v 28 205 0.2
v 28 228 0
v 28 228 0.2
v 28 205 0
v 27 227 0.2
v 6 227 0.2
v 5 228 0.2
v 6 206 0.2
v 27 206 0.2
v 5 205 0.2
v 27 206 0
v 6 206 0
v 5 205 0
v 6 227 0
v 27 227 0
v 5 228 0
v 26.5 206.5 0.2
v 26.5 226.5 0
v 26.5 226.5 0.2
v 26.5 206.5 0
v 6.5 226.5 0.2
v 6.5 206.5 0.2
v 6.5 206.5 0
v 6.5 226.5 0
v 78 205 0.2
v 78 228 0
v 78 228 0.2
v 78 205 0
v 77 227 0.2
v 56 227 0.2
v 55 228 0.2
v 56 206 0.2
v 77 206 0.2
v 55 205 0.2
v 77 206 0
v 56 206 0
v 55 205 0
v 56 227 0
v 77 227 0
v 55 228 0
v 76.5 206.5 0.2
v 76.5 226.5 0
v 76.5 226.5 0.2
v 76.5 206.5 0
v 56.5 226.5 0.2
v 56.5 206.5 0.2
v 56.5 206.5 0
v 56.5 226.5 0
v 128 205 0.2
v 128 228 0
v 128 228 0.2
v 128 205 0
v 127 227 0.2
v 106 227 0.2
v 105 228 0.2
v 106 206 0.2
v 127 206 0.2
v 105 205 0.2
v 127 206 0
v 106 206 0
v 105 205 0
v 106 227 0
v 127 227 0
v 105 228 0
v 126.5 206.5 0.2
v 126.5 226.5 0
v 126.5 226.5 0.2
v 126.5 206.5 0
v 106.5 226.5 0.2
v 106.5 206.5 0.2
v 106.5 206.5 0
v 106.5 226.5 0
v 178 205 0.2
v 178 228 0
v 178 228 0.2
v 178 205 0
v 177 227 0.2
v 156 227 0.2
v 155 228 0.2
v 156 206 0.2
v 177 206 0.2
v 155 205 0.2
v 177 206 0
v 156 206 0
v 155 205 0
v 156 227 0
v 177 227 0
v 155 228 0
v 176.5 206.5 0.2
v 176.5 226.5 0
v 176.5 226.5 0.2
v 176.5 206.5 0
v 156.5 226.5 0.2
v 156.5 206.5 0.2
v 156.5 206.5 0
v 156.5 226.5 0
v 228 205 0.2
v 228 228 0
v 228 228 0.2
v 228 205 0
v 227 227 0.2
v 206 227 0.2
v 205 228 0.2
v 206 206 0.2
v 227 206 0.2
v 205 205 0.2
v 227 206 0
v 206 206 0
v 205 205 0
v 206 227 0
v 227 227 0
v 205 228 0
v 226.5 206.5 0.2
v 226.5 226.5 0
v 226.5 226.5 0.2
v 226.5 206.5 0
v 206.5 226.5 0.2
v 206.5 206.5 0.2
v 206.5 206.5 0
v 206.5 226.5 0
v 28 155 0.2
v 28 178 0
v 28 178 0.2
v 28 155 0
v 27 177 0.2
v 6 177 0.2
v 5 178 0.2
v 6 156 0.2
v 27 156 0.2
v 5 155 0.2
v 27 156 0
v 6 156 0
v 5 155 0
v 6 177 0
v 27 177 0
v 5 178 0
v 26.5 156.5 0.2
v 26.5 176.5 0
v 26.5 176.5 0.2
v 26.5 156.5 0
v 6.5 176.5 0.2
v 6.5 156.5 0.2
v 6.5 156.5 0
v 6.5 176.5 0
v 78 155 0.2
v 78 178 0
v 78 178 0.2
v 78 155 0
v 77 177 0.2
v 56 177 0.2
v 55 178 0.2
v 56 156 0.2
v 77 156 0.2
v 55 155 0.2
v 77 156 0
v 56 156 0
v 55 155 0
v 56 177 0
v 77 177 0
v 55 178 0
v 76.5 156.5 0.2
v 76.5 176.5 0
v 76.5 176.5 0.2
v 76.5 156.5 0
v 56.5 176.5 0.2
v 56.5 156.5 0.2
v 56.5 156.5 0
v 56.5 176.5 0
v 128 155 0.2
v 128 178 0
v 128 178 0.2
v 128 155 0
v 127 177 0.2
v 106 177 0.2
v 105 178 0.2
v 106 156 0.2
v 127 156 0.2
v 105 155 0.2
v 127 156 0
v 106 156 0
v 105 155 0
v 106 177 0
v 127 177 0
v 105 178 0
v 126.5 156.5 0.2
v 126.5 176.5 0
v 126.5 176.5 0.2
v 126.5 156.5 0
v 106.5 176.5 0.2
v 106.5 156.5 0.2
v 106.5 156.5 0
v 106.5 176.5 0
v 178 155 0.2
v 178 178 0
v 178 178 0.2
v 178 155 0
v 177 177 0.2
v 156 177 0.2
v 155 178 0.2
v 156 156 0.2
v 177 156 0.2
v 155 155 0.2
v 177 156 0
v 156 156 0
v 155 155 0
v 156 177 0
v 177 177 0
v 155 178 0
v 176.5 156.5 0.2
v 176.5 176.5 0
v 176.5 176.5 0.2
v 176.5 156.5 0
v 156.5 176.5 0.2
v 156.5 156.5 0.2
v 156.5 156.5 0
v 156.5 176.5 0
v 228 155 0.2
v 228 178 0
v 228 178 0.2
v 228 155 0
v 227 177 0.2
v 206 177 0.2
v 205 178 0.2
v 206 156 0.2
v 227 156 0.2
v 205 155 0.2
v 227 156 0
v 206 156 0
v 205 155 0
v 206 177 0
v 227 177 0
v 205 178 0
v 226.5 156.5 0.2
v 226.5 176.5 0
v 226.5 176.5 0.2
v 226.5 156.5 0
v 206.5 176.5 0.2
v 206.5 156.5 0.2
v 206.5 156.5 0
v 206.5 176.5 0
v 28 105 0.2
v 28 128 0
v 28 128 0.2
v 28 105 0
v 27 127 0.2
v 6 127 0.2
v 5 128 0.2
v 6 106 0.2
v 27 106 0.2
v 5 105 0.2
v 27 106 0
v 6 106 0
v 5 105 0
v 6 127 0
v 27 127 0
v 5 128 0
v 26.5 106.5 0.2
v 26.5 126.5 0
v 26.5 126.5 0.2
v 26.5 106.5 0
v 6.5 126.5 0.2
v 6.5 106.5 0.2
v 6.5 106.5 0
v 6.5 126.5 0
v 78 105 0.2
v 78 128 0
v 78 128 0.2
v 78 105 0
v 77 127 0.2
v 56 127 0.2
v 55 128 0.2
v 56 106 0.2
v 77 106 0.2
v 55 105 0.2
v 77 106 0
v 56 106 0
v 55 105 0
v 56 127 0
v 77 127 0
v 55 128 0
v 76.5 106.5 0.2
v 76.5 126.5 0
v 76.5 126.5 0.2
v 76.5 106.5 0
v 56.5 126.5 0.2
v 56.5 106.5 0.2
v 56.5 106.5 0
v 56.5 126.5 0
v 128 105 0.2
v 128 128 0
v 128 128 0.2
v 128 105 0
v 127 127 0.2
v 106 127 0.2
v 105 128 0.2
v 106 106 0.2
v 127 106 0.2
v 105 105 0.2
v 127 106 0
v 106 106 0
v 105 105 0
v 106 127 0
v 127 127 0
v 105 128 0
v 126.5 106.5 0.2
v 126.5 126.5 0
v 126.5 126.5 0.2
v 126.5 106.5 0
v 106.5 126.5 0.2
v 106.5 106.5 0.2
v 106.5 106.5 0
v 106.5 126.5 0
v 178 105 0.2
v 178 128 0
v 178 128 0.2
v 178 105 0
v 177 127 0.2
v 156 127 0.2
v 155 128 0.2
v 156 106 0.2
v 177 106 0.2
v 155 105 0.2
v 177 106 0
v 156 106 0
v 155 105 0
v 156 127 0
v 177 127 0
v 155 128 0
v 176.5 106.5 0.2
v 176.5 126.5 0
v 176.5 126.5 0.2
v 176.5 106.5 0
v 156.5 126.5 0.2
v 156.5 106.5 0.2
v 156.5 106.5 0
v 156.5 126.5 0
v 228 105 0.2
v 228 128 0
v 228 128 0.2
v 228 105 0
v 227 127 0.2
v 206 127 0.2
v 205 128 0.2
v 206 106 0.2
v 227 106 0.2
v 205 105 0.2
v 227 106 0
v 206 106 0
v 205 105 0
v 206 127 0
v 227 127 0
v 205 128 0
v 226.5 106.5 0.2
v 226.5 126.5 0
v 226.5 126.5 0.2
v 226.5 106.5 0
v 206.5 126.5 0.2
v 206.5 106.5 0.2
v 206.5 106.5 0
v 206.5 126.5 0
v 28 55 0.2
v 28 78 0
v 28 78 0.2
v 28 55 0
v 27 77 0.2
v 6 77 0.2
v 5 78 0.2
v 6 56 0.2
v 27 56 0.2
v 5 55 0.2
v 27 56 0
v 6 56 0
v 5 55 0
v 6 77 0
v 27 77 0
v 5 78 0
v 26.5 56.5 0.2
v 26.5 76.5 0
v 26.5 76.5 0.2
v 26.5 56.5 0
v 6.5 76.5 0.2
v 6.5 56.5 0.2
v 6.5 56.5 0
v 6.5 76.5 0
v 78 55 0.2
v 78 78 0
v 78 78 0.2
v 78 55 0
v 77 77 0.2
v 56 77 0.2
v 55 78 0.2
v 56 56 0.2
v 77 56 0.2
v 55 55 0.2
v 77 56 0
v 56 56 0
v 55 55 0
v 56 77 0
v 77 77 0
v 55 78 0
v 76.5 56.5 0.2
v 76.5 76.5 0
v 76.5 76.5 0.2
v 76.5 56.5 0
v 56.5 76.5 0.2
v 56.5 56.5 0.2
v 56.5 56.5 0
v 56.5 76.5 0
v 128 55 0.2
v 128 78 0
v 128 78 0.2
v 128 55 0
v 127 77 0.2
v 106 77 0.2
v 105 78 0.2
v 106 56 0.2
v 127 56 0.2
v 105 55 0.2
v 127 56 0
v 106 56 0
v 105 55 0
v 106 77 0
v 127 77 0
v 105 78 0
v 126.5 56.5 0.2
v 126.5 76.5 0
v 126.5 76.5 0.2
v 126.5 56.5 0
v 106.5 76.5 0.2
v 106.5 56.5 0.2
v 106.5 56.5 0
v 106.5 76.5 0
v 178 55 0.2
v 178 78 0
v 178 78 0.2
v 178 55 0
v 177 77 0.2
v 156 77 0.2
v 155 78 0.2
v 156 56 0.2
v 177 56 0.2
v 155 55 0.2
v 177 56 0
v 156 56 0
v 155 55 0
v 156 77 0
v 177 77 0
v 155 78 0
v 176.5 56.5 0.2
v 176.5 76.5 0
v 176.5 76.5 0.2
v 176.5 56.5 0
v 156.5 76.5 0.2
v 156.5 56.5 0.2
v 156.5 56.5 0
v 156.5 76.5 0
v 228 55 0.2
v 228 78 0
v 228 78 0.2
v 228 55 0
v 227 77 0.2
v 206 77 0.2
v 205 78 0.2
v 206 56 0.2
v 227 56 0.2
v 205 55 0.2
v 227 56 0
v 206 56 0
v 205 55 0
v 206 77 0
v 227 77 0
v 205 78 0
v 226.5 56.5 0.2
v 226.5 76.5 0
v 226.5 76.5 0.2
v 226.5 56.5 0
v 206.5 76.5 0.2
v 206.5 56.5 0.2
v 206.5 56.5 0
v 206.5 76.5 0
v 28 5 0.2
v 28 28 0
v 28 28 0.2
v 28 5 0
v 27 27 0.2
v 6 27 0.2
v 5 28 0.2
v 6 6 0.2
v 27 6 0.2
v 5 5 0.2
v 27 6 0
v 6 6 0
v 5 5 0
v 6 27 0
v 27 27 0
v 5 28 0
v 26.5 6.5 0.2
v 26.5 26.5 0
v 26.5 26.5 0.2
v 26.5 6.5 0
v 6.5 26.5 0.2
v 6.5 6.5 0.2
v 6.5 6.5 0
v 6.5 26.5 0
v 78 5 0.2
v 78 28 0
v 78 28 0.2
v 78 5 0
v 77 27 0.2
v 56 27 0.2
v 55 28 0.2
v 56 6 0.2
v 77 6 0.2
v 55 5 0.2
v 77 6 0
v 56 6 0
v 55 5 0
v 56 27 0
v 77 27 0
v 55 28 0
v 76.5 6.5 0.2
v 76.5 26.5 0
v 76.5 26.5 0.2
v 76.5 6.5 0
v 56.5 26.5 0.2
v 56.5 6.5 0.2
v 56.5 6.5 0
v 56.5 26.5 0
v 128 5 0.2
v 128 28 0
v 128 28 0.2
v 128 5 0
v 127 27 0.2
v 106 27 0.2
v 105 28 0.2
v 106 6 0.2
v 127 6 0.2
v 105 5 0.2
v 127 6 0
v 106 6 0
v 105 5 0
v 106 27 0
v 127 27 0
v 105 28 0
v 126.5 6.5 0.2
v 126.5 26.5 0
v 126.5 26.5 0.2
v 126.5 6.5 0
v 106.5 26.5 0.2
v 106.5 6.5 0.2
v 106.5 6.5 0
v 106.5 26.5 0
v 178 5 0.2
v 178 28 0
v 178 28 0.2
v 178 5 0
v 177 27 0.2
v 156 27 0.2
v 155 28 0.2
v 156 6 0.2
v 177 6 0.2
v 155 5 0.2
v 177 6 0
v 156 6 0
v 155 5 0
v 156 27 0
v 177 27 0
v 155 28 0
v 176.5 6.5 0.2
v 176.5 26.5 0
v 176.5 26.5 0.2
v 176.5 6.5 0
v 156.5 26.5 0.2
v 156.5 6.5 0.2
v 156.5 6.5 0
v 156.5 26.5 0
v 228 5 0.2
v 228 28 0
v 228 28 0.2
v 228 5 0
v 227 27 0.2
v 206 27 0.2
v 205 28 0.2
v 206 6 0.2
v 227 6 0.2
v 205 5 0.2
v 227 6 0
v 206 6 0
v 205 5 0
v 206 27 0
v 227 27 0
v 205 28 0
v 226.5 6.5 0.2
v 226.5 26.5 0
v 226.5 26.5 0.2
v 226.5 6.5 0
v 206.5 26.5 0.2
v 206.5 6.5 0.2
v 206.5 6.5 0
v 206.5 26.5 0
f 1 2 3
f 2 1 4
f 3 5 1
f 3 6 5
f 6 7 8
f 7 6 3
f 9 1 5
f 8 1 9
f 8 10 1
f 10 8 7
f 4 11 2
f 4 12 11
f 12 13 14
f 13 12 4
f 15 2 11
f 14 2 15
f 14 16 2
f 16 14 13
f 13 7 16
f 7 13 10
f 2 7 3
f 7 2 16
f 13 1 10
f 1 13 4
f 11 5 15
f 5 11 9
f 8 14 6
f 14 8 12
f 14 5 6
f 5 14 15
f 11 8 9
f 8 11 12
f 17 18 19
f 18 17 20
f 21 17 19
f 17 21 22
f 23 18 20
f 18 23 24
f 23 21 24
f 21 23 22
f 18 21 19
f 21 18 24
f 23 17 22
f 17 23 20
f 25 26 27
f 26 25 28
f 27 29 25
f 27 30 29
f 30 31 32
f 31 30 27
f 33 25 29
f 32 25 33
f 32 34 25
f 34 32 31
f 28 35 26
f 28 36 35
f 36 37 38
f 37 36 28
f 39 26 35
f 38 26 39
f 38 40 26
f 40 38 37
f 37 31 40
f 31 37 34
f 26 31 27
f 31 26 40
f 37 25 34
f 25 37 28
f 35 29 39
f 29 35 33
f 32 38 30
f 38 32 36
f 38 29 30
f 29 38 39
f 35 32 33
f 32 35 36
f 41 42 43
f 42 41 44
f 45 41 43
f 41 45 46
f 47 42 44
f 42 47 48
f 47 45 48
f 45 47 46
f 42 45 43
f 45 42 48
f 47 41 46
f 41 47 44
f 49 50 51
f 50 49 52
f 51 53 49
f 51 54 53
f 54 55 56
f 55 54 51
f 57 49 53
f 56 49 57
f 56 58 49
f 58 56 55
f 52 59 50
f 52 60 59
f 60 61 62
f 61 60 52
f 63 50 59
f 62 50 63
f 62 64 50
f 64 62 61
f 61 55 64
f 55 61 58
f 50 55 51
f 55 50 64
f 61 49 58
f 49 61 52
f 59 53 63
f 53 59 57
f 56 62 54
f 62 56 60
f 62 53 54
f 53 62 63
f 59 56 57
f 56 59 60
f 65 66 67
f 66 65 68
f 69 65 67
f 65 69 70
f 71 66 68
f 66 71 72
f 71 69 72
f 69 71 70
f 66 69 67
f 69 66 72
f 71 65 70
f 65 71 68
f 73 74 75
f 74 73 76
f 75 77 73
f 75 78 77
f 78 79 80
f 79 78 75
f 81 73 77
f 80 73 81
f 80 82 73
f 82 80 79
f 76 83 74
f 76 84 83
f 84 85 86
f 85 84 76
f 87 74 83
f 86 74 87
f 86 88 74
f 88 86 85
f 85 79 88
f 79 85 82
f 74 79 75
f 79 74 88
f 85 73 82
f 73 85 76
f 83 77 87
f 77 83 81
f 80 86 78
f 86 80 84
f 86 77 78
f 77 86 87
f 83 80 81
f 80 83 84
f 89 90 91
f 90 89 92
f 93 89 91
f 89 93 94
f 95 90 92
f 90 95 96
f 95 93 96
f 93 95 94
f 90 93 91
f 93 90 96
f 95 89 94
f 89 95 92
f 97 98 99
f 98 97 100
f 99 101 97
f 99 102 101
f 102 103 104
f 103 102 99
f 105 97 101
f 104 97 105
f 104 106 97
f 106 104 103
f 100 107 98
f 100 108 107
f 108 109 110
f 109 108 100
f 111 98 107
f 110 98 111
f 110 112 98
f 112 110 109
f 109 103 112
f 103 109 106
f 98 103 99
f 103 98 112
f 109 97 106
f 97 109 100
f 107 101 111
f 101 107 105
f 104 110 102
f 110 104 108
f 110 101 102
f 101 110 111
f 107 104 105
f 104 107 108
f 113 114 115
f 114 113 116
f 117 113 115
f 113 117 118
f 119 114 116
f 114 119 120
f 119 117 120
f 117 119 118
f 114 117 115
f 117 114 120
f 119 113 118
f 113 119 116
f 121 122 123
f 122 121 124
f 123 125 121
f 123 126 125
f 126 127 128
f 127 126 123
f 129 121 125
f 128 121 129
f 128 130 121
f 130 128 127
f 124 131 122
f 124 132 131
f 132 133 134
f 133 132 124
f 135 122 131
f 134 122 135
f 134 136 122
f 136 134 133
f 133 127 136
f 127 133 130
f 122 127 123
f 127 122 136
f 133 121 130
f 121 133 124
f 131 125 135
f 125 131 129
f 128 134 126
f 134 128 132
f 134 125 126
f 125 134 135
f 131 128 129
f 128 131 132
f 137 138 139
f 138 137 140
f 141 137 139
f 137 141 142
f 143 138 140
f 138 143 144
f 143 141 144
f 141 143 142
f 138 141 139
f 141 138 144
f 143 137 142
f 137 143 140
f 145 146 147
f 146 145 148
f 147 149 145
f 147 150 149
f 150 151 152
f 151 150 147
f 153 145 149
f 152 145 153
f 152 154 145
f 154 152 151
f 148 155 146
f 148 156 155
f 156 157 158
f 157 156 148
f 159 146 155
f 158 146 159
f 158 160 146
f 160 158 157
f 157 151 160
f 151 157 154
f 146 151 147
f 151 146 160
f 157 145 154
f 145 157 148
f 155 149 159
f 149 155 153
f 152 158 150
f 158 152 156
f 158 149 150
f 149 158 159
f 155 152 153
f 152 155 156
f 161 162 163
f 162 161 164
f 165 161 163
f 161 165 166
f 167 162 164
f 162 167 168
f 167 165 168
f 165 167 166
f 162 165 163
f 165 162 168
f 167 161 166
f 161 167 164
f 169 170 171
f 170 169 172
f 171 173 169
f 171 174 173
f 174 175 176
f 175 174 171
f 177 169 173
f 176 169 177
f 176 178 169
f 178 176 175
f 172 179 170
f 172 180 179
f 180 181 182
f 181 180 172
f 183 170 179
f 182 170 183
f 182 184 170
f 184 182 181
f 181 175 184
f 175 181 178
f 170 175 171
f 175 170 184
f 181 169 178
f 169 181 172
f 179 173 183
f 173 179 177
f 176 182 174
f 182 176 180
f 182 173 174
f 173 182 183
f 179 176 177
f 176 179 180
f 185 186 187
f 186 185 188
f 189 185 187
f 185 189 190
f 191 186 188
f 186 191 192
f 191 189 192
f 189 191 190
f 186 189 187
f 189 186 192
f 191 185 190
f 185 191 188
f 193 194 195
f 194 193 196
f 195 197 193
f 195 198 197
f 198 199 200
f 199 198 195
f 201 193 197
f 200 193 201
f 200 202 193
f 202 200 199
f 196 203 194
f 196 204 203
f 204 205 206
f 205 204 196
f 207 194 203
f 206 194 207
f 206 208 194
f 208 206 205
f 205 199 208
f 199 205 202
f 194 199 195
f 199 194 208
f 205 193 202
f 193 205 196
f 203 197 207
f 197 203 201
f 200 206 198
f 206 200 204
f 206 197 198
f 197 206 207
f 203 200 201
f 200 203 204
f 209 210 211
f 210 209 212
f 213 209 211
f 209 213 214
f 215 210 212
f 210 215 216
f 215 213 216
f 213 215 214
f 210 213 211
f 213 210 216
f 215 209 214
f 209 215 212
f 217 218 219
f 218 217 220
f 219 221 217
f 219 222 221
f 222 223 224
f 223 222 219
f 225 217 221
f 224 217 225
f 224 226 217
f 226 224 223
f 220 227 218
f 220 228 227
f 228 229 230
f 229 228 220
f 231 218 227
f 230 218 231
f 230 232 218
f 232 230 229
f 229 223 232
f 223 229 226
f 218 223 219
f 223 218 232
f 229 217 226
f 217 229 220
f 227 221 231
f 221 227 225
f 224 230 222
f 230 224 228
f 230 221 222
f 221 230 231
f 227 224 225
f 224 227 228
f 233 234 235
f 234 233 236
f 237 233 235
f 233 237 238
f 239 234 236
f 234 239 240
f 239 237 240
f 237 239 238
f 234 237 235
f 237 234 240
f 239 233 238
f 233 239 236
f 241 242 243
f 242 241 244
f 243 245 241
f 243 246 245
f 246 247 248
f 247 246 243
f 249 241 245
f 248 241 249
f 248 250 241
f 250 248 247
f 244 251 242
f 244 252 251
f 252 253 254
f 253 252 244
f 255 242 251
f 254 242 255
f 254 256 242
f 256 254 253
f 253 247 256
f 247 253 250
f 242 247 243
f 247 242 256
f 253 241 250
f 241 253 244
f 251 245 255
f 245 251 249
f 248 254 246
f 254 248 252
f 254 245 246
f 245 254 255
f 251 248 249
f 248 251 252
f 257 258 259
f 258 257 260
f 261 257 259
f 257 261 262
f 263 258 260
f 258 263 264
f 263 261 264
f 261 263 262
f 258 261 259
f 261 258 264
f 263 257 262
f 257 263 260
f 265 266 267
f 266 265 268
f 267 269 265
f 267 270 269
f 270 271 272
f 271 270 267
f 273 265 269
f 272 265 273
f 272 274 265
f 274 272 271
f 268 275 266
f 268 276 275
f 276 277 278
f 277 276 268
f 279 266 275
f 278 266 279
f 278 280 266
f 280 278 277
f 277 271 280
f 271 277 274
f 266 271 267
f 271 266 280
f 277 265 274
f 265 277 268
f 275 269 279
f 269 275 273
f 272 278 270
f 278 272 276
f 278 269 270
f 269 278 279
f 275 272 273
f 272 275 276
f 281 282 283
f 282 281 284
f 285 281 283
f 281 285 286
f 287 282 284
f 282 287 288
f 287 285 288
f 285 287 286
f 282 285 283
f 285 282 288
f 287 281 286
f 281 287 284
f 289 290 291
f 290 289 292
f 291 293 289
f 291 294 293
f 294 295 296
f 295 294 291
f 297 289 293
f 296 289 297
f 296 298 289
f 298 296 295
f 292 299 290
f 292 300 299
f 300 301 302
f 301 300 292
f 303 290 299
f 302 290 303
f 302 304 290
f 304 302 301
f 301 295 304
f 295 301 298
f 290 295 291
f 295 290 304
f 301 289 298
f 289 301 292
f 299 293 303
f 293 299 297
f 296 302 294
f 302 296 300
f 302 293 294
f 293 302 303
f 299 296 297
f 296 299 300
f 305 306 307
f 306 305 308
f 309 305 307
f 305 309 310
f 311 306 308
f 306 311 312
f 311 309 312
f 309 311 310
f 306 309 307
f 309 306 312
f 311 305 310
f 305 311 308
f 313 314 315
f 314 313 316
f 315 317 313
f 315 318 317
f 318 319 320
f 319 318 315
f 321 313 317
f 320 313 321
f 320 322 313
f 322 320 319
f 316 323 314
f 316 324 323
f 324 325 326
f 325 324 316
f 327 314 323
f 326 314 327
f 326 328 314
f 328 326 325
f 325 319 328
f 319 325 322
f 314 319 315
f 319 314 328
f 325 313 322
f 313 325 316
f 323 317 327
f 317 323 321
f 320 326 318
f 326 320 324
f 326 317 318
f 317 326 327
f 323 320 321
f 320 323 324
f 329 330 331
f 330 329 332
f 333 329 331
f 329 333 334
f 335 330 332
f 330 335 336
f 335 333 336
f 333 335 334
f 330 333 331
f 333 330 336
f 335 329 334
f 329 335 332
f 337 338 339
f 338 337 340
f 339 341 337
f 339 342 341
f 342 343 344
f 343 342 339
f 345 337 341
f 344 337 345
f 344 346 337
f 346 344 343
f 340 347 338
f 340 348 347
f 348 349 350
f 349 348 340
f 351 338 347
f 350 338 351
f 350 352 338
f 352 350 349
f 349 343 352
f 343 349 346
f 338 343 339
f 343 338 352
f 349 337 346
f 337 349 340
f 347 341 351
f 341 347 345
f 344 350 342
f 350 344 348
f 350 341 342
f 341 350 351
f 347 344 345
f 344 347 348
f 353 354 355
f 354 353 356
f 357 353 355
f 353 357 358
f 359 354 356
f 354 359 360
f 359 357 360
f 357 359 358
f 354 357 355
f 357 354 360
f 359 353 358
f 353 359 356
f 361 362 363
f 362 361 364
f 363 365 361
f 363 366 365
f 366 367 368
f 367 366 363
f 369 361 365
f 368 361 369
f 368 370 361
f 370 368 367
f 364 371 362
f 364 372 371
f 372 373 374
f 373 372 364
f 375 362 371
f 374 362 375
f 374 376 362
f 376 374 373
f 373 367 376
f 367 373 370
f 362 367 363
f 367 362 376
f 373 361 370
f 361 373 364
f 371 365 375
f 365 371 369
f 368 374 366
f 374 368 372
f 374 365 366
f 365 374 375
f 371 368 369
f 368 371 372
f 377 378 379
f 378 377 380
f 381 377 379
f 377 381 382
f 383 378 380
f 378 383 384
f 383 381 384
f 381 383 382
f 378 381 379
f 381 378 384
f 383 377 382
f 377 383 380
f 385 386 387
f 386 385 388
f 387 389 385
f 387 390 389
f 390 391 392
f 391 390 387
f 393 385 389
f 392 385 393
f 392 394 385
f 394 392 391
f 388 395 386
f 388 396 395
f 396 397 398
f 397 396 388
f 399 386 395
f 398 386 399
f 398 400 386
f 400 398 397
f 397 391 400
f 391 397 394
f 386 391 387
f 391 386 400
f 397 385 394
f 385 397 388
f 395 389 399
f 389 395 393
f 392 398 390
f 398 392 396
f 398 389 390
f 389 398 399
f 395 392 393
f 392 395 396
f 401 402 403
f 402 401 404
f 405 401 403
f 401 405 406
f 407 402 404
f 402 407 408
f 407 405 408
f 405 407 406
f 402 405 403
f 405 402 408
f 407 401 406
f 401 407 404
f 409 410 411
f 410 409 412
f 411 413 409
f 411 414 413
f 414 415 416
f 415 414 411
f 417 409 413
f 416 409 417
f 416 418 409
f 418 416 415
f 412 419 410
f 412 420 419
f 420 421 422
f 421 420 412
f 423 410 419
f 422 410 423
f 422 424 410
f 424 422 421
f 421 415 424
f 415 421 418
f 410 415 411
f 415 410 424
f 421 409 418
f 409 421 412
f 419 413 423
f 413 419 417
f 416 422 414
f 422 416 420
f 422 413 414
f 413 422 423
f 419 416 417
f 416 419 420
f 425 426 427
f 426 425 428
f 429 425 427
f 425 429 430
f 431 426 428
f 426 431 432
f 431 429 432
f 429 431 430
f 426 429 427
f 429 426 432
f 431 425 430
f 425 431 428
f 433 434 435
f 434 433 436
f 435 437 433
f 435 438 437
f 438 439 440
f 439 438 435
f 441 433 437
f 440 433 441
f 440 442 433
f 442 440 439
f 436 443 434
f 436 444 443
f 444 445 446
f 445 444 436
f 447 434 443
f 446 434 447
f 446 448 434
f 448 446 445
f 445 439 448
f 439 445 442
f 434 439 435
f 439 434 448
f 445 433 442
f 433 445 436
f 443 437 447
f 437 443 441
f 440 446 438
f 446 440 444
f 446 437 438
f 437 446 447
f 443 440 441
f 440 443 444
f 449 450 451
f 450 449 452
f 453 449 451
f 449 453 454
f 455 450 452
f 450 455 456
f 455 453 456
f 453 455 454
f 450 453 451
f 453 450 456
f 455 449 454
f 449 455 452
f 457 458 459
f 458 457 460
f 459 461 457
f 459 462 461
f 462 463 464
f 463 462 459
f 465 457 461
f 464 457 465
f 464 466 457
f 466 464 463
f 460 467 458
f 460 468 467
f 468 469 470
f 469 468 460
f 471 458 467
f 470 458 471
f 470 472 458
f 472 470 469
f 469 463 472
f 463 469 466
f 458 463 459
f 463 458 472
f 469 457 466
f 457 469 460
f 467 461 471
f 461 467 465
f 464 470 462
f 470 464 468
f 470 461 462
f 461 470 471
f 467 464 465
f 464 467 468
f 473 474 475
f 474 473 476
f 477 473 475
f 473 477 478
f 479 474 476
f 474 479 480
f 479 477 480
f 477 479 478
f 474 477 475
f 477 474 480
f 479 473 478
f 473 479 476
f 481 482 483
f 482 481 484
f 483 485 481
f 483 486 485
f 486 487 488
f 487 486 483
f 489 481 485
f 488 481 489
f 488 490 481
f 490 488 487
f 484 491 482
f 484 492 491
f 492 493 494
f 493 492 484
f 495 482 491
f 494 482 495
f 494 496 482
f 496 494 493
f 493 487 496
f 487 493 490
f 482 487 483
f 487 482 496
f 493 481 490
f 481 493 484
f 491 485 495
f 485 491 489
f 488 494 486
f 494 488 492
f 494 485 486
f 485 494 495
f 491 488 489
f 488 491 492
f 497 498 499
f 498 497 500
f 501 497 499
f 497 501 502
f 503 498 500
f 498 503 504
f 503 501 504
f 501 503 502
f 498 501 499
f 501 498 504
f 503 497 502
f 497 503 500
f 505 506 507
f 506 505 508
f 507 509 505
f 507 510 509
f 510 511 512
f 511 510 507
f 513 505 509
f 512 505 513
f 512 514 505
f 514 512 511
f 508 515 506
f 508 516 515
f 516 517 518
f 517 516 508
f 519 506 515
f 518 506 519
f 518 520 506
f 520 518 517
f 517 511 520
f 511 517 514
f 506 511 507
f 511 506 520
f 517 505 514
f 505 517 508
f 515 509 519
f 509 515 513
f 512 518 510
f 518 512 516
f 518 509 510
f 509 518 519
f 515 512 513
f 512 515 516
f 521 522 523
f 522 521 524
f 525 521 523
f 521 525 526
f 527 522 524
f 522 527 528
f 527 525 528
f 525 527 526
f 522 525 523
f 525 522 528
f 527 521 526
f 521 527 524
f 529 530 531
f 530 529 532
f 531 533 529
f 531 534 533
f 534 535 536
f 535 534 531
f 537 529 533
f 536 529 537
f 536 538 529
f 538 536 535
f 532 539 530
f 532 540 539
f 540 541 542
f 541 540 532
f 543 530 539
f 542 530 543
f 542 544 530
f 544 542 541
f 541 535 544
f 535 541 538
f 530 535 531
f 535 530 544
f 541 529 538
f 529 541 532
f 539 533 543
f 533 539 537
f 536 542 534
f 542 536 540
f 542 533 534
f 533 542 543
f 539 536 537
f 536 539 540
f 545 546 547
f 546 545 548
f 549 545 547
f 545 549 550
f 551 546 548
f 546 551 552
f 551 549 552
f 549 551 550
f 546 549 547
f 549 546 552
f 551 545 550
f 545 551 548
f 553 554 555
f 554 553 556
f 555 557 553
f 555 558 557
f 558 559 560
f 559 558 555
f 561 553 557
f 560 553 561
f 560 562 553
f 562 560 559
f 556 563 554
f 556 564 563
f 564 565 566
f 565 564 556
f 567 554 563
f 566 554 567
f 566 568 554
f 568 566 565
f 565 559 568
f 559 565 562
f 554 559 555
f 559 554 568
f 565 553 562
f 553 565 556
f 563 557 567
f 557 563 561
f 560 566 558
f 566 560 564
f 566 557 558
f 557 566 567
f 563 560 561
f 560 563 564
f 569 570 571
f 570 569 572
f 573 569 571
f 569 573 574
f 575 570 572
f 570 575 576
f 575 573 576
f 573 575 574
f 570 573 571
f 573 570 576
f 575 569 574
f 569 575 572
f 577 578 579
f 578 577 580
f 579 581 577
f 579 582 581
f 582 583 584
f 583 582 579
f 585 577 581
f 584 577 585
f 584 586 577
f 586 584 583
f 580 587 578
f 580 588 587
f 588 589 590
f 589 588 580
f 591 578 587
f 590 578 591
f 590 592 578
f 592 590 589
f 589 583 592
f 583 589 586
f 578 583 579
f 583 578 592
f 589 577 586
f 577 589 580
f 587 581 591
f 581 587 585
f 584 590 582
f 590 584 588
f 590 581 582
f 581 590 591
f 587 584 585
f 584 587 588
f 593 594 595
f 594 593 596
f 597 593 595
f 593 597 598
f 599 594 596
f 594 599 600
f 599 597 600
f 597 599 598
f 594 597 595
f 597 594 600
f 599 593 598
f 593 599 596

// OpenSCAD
/**
 * Print designed to check that you bed is level
 *
 * print four small squares in each corner to ensure even print quality and good adhesion.
 */

// Define your printers printable area
// If you are using Sprinter firmware then these come directly from configuration.h

/* [Dimensions] */

//Length of X axis [mm]
X_MAX_LENGTH = 230; // [1:1:500]

//Length of Y axis [mm]
Y_MAX_LENGTH = 230; // [1:500]

//Thickness (height) of square [mm]
THICKNESS = 0.2; // [0:0.05:1]

/* [Customize grid] */

//Choose preconfigured grid or choose custom and change parameters below
PRESET = "all"; // [custom:Custom (use parameters below),corners_only:Corners only,3x3:3x3 grid,all:Full 5x5 grid]

//Do you want to see square X1 Y1?
GRID_1_1 = 1; // [0:No, 1:Yes]
//Do you want to see square X2 Y1?
GRID_2_1 = 1; // [0:No, 1:Yes]
//Do you want to see square X3 Y1?
GRID_3_1 = 1; // [0:No, 1:Yes]
//Do you want to see square X4 Y1?
GRID_4_1 = 1; // [0:No, 1:Yes]
//Do you want to see square X5 Y1?
GRID_5_1 = 1; // [0:No, 1:Yes]
//Do you want to see square X1 Y2?
GRID_1_2 = 1; // [0:No, 1:Yes]
//Do you want to see square X2 Y2?
GRID_2_2 = 1; // [0:No, 1:Yes]
//Do you want to see square X3 Y2?
GRID_3_2 = 1; // [0:No, 1:Yes]
//Do you want to see square X4 Y2?
GRID_4_2 = 1; // [0:No, 1:Yes]
//Do you want to see square X5 Y2?
GRID_5_2 = 1; // [0:No, 1:Yes]
//Do you want to see square X1 Y3?
GRID_1_3 = 1; // [0:No, 1:Yes]
//Do you want to see square X2 Y3?
GRID_2_3 = 1; // [0:No, 1:Yes]
//Do you want to see square X3 Y3?
GRID_3_3 = 1; // [0:No, 1:Yes]
//Do you want to see square X4 Y3?
GRID_4_3 = 1; // [0:No, 1:Yes]
//Do you want to see square X5 Y3?
GRID_5_3 = 1; // [0:No, 1:Yes]
//Do you want to see square X1 Y4?
GRID_1_4 = 1; // [0:No, 1:Yes]
//Do you want to see square X2 Y4?
GRID_2_4 = 1; // [0:No, 1:Yes]
//Do you want to see square X3 Y4?
GRID_3_4 = 1; // [0:No, 1:Yes]
//Do you want to see square X4 Y4?
GRID_4_4 = 1; // [0:No, 1:Yes]
//Do you want to see square X5 Y4?
GRID_5_4 = 1; // [0:No, 1:Yes]
//Do you want to see square X1 Y5?
GRID_1_5 = 1; // [0:No, 1:Yes]
//Do you want to see square X2 Y5?
GRID_2_5 = 1; // [0:No, 1:Yes]
//Do you want to see square X3 Y5?
GRID_3_5 = 1; // [0:No, 1:Yes]
//Do you want to see square X4 Y5?
GRID_4_5 = 1; // [0:No, 1:Yes]
//Do you want to see square X5 Y5?
GRID_5_5 = 1; // [0:No, 1:Yes]

/* [For experts] */

//Square size [mm]
SIZE = 20; // [1:1:100]

//Width of margin between square and parameter
GAP = 0.5; // [0:0.1:2]

//Width of outline
OUTLINE_WIDTH = 1; //[0:0.1:2]

//Offset from limits in each axis
OFFSET = 5; // [1:1:500]

if (PRESET == "custom") {
    /* Grid X1 */
    if (GRID_1_1) {
        translate([OFFSET, Y_MAX_LENGTH - OFFSET - SIZE, 0]) square(); //Top Left
    }
    if (GRID_2_1) {
        translate([OFFSET + SIZE + (  ((X_MAX_LENGTH / 2) - (SIZE / 2) - (OFFSET + SIZE)) / 2 - (SIZE / 2)  ), Y_MAX_LENGTH - OFFSET - SIZE, 0]) square(); //Top Left-Middle
    }
    if (GRID_3_1) {
        translate([(X_MAX_LENGTH / 2) - (SIZE / 2), Y_MAX_LENGTH - OFFSET - SIZE, 0]) square(); //Top Middle
    }
    if (GRID_4_1) {
        translate([(X_MAX_LENGTH / 2) + (SIZE / 2) + (  ((X_MAX_LENGTH - OFFSET - SIZE) - (X_MAX_LENGTH / 2) - (SIZE / 2)) / 2 - (SIZE / 2)  ), Y_MAX_LENGTH - OFFSET - SIZE, 0]) square(); //Top Right-Middle
    }
    if (GRID_5_1) {
        translate([X_MAX_LENGTH - OFFSET - SIZE, Y_MAX_LENGTH - OFFSET - SIZE, 0]) square(); //Top Right
    }

    /* Grid X2 */
    if (GRID_1_2) {
        translate([OFFSET, (Y_MAX_LENGTH / 2) + (SIZE / 2) + (  ((Y_MAX_LENGTH - OFFSET - SIZE) - (Y_MAX_LENGTH / 2) - (SIZE / 2)) / 2 - (SIZE / 2)  ), 0]) square(); //Top-Middle Left
    }
    if (GRID_2_2) {
        translate([OFFSET + SIZE + (  ((X_MAX_LENGTH / 2) - (SIZE / 2) - (OFFSET + SIZE)) / 2 - (SIZE / 2)  ), (Y_MAX_LENGTH / 2) + (SIZE / 2) + (  ((Y_MAX_LENGTH - OFFSET - SIZE) - (Y_MAX_LENGTH / 2) - (SIZE / 2)) / 2 - (SIZE / 2)  ), 0]) square(); //Top-Middle Left-Middle
    }
    if (GRID_3_2) {
        translate([(X_MAX_LENGTH / 2) - (SIZE / 2), (Y_MAX_LENGTH / 2) + (SIZE / 2) + (  ((Y_MAX_LENGTH - OFFSET - SIZE) - (Y_MAX_LENGTH / 2) - (SIZE / 2)) / 2 - (SIZE / 2)  ), 0]) square(); //Top-Middle Middle
    }
    if (GRID_4_2) {
        translate([(X_MAX_LENGTH / 2) + (SIZE / 2) + (  ((X_MAX_LENGTH - OFFSET - SIZE) - (X_MAX_LENGTH / 2) - (SIZE / 2)) / 2 - (SIZE / 2)  ), (Y_MAX_LENGTH / 2) + (SIZE / 2) + (  ((Y_MAX_LENGTH - OFFSET - SIZE) - (Y_MAX_LENGTH / 2) - (SIZE / 2)) / 2 - (SIZE / 2)  ), 0]) square(); //Top-Middle Right-Middle
    }
    if (GRID_5_2) {
        translate([X_MAX_LENGTH - OFFSET - SIZE, (Y_MAX_LENGTH / 2) + (SIZE / 2) + (  ((Y_MAX_LENGTH - OFFSET - SIZE) - (Y_MAX_LENGTH / 2) - (SIZE / 2)) / 2 - (SIZE / 2)  ), 0]) square(); //Top-Middle Right
    }

    /* Grid X3 */
    if (GRID_1_3) {
        translate([OFFSET, (Y_MAX_LENGTH / 2) - (SIZE / 2), 0]) square(); //Middle Left
    }
    if (GRID_2_3) {
        translate([OFFSET + SIZE + (  ((X_MAX_LENGTH / 2) - (SIZE / 2) - (OFFSET + SIZE)) / 2 - (SIZE / 2)  ), (Y_MAX_LENGTH / 2) - (SIZE / 2), 0]) square(); //Middle Left-Middle
    }
    if (GRID_3_3) {
        translate([(X_MAX_LENGTH / 2) - (SIZE / 2), (Y_MAX_LENGTH / 2) - (SIZE / 2), 0]) square(); //Middle Middle
    }
    if (GRID_4_3) {
        translate([(X_MAX_LENGTH / 2) + (SIZE / 2) + (  ((X_MAX_LENGTH - OFFSET - SIZE) - (X_MAX_LENGTH / 2) - (SIZE / 2)) / 2 - (SIZE / 2)  ), (Y_MAX_LENGTH / 2) - (SIZE / 2), 0]) square(); //Middle Right-Middle
    }
    if (GRID_5_3) {
        translate([X_MAX_LENGTH - OFFSET - SIZE, (Y_MAX_LENGTH / 2) - (SIZE / 2), 0]) square(); //Middle Right
    }

    /* Grid X4 */
    if (GRID_1_4) {
        translate([OFFSET, OFFSET + SIZE + (  ((Y_MAX_LENGTH / 2) - (SIZE / 2) - (OFFSET + SIZE)) / 2 - (SIZE / 2)  ), 0]) square(); //Bottom-Middle Left
    }
    if (GRID_2_4) {
        translate([OFFSET + SIZE + (  ((X_MAX_LENGTH / 2) - (SIZE / 2) - (OFFSET + SIZE)) / 2 - (SIZE / 2)  ), OFFSET + SIZE + (  ((Y_MAX_LENGTH / 2) - (SIZE / 2) - (OFFSET + SIZE)) / 2 - (SIZE / 2)  ), 0]) square(); //Bottom-Middle Left-Middle
    }
    if (GRID_3_4) {
        translate([(X_MAX_LENGTH / 2) - (SIZE / 2), OFFSET + SIZE + (  ((Y_MAX_LENGTH / 2) - (SIZE / 2) - (OFFSET + SIZE)) / 2 - (SIZE / 2)  ), 0]) square(); //Bottom-Middle Middle
    }
    if (GRID_4_4) {
        translate([(X_MAX_LENGTH / 2) + (SIZE / 2) + (  ((X_MAX_LENGTH - OFFSET - SIZE) - (X_MAX_LENGTH / 2) - (SIZE / 2)) / 2 - (SIZE / 2)  ), OFFSET + SIZE + (  ((Y_MAX_LENGTH / 2) - (SIZE / 2) - (OFFSET + SIZE)) / 2 - (SIZE / 2)  ), 0]) square(); //Bottom-Middle Right-Middle
    }
    if (GRID_5_4) {
        translate([X_MAX_LENGTH - OFFSET - SIZE, OFFSET + SIZE + (  ((Y_MAX_LENGTH / 2) - (SIZE / 2) - (OFFSET + SIZE)) / 2 - (SIZE / 2)  ), 0]) square(); //Bottom-Middle Right
    }

    if (GRID_1_5) {
        translate([OFFSET, OFFSET, 0]) square(); //Bottom Left
    }
    if (GRID_2_5) {
        translate([OFFSET + SIZE + (  ((X_MAX_LENGTH / 2) - (SIZE / 2) - (OFFSET + SIZE)) / 2 - (SIZE / 2)  ), OFFSET, 0]) square(); //Bottom Left-Middle
    }
    if (GRID_3_5) {
        translate([(X_MAX_LENGTH / 2) - (SIZE / 2), OFFSET, 0]) square(); //Bottom Middle
    }
    if (GRID_4_5) {
        translate([(X_MAX_LENGTH / 2) + (SIZE / 2) + (  ((X_MAX_LENGTH - OFFSET - SIZE) - (X_MAX_LENGTH / 2) - (SIZE / 2)) / 2 - (SIZE / 2)  ), OFFSET, 0]) square(); //Bottom Right-Middle
    }
    if (GRID_5_5) {
        translate([X_MAX_LENGTH - OFFSET - SIZE, OFFSET, 0]) square(); //Bottom Right
    }
} else if (PRESET == "all") {
    translate([OFFSET, Y_MAX_LENGTH - OFFSET - SIZE, 0]) square(); //Top Left
    translate([OFFSET + SIZE + (  ((X_MAX_LENGTH / 2) - (SIZE / 2) - (OFFSET + SIZE)) / 2 - (SIZE / 2)  ), Y_MAX_LENGTH - OFFSET - SIZE, 0]) square(); //Top Left-Middle
    translate([(X_MAX_LENGTH / 2) - (SIZE / 2), Y_MAX_LENGTH - OFFSET - SIZE, 0]) square(); //Top Middle
    translate([(X_MAX_LENGTH / 2) + (SIZE / 2) + (  ((X_MAX_LENGTH - OFFSET - SIZE) - (X_MAX_LENGTH / 2) - (SIZE / 2)) / 2 - (SIZE / 2)  ), Y_MAX_LENGTH - OFFSET - SIZE, 0]) square(); //Top Right-Middle
    translate([X_MAX_LENGTH - OFFSET - SIZE, Y_MAX_LENGTH - OFFSET - SIZE, 0]) square(); //Top Right

    translate([OFFSET, (Y_MAX_LENGTH / 2) + (SIZE / 2) + (  ((Y_MAX_LENGTH - OFFSET - SIZE) - (Y_MAX_LENGTH / 2) - (SIZE / 2)) / 2 - (SIZE / 2)  ), 0]) square(); //Top-Middle Left
    translate([OFFSET + SIZE + (  ((X_MAX_LENGTH / 2) - (SIZE / 2) - (OFFSET + SIZE)) / 2 - (SIZE / 2)  ), (Y_MAX_LENGTH / 2) + (SIZE / 2) + (  ((Y_MAX_LENGTH - OFFSET - SIZE) - (Y_MAX_LENGTH / 2) - (SIZE / 2)) / 2 - (SIZE / 2)  ), 0]) square(); //Top-Middle Left-Middle
    translate([(X_MAX_LENGTH / 2) - (SIZE / 2), (Y_MAX_LENGTH / 2) + (SIZE / 2) + (  ((Y_MAX_LENGTH - OFFSET - SIZE) - (Y_MAX_LENGTH / 2) - (SIZE / 2)) / 2 - (SIZE / 2)  ), 0]) square(); //Top-Middle Middle
    translate([(X_MAX_LENGTH / 2) + (SIZE / 2) + (  ((X_MAX_LENGTH - OFFSET - SIZE) - (X_MAX_LENGTH / 2) - (SIZE / 2)) / 2 - (SIZE / 2)  ), (Y_MAX_LENGTH / 2) + (SIZE / 2) + (  ((Y_MAX_LENGTH - OFFSET - SIZE) - (Y_MAX_LENGTH / 2) - (SIZE / 2)) / 2 - (SIZE / 2)  ), 0]) square(); //Top-Middle Right-Middle
    translate([X_MAX_LENGTH - OFFSET - SIZE, (Y_MAX_LENGTH / 2) + (SIZE / 2) + (  ((Y_MAX_LENGTH - OFFSET - SIZE) - (Y_MAX_LENGTH / 2) - (SIZE / 2)) / 2 - (SIZE / 2)  ), 0]) square(); //Top-Middle Right

    translate([OFFSET, (Y_MAX_LENGTH / 2) - (SIZE / 2), 0]) square(); //Middle Left
    translate([OFFSET + SIZE + (  ((X_MAX_LENGTH / 2) - (SIZE / 2) - (OFFSET + SIZE)) / 2 - (SIZE / 2)  ), (Y_MAX_LENGTH / 2) - (SIZE / 2), 0]) square(); //Middle Left-Middle
    translate([(X_MAX_LENGTH / 2) - (SIZE / 2), (Y_MAX_LENGTH / 2) - (SIZE / 2), 0]) square(); //Middle Middle
    translate([(X_MAX_LENGTH / 2) + (SIZE / 2) + (  ((X_MAX_LENGTH - OFFSET - SIZE) - (X_MAX_LENGTH / 2) - (SIZE / 2)) / 2 - (SIZE / 2)  ), (Y_MAX_LENGTH / 2) - (SIZE / 2), 0]) square(); //Middle Right-Middle
    translate([X_MAX_LENGTH - OFFSET - SIZE, (Y_MAX_LENGTH / 2) - (SIZE / 2), 0]) square(); //Middle Right

    translate([OFFSET, OFFSET + SIZE + (  ((Y_MAX_LENGTH / 2) - (SIZE / 2) - (OFFSET + SIZE)) / 2 - (SIZE / 2)  ), 0]) square(); //Bottom-Middle Left
    translate([OFFSET + SIZE + (  ((X_MAX_LENGTH / 2) - (SIZE / 2) - (OFFSET + SIZE)) / 2 - (SIZE / 2)  ), OFFSET + SIZE + (  ((Y_MAX_LENGTH / 2) - (SIZE / 2) - (OFFSET + SIZE)) / 2 - (SIZE / 2)  ), 0]) square(); //Bottom-Middle Left-Middle
    translate([(X_MAX_LENGTH / 2) - (SIZE / 2), OFFSET + SIZE + (  ((Y_MAX_LENGTH / 2) - (SIZE / 2) - (OFFSET + SIZE)) / 2 - (SIZE / 2)  ), 0]) square(); //Bottom-Middle Middle
    translate([(X_MAX_LENGTH / 2) + (SIZE / 2) + (  ((X_MAX_LENGTH - OFFSET - SIZE) - (X_MAX_LENGTH / 2) - (SIZE / 2)) / 2 - (SIZE / 2)  ), OFFSET + SIZE + (  ((Y_MAX_LENGTH / 2) - (SIZE / 2) - (OFFSET + SIZE)) / 2 - (SIZE / 2)  ), 0]) square(); //Bottom-Middle Right-Middle
    translate([X_MAX_LENGTH - OFFSET - SIZE, OFFSET + SIZE + (  ((Y_MAX_LENGTH / 2) - (SIZE / 2) - (OFFSET + SIZE)) / 2 - (SIZE / 2)  ), 0]) square(); //Bottom-Middle Right

    translate([OFFSET, OFFSET, 0]) square(); //Bottom Left
    translate([OFFSET + SIZE + (  ((X_MAX_LENGTH / 2) - (SIZE / 2) - (OFFSET + SIZE)) / 2 - (SIZE / 2)  ), OFFSET, 0]) square(); //Bottom Left-Middle
    translate([(X_MAX_LENGTH / 2) - (SIZE / 2), OFFSET, 0]) square(); //Bottom Middle
    translate([(X_MAX_LENGTH / 2) + (SIZE / 2) + (  ((X_MAX_LENGTH - OFFSET - SIZE) - (X_MAX_LENGTH / 2) - (SIZE / 2)) / 2 - (SIZE / 2)  ), OFFSET, 0]) square(); //Bottom Right-Middle
    translate([X_MAX_LENGTH - OFFSET - SIZE, OFFSET, 0]) square(); //Bottom Right
} else if (PRESET == "corners_only") {
    translate([OFFSET, Y_MAX_LENGTH - OFFSET - SIZE, 0]) square(); //Top Left
    translate([X_MAX_LENGTH - OFFSET - SIZE, Y_MAX_LENGTH - OFFSET - SIZE, 0]) square(); //Top Right
    translate([OFFSET, OFFSET, 0]) square(); //Bottom Left
    translate([X_MAX_LENGTH - OFFSET - SIZE, OFFSET, 0]) square(); //Bottom Right
} else if (PRESET == "3x3") {
    translate([OFFSET, Y_MAX_LENGTH - OFFSET - SIZE, 0]) square(); //Top Left
    translate([(X_MAX_LENGTH / 2) - (SIZE / 2), Y_MAX_LENGTH - OFFSET - SIZE, 0]) square(); //Top Middle
    translate([X_MAX_LENGTH - OFFSET - SIZE, Y_MAX_LENGTH - OFFSET - SIZE, 0]) square(); //Top Right

    translate([OFFSET, (Y_MAX_LENGTH / 2) - (SIZE / 2), 0]) square(); //Middle Left
    translate([(X_MAX_LENGTH / 2) - (SIZE / 2), (Y_MAX_LENGTH / 2) - (SIZE / 2), 0]) square(); //Middle Middle
    translate([X_MAX_LENGTH - OFFSET - SIZE, (Y_MAX_LENGTH / 2) - (SIZE / 2), 0]) square(); //Middle Right

    translate([OFFSET, OFFSET, 0]) square(); //Bottom Left
    translate([(X_MAX_LENGTH / 2) - (SIZE / 2), OFFSET, 0]) square(); //Bottom Middle
    translate([X_MAX_LENGTH - OFFSET - SIZE, OFFSET, 0]) square(); //Bottom Right
}

module square() {
	//Center square
	translate([
				OUTLINE_WIDTH + GAP,
				OUTLINE_WIDTH + GAP,
				0
			])
		cube([SIZE, SIZE, THICKNESS]);

	//Parameter
	difference() {
		//Outer square
		cube([
				SIZE + (2 * (GAP + OUTLINE_WIDTH)),
				SIZE + (2 * (GAP + OUTLINE_WIDTH)),
				THICKNESS
			]);

		//Inner square
		translate([OUTLINE_WIDTH, OUTLINE_WIDTH, -5])
			cube([SIZE + (2 * GAP), SIZE + (2 * GAP), 10]);
	}
}
